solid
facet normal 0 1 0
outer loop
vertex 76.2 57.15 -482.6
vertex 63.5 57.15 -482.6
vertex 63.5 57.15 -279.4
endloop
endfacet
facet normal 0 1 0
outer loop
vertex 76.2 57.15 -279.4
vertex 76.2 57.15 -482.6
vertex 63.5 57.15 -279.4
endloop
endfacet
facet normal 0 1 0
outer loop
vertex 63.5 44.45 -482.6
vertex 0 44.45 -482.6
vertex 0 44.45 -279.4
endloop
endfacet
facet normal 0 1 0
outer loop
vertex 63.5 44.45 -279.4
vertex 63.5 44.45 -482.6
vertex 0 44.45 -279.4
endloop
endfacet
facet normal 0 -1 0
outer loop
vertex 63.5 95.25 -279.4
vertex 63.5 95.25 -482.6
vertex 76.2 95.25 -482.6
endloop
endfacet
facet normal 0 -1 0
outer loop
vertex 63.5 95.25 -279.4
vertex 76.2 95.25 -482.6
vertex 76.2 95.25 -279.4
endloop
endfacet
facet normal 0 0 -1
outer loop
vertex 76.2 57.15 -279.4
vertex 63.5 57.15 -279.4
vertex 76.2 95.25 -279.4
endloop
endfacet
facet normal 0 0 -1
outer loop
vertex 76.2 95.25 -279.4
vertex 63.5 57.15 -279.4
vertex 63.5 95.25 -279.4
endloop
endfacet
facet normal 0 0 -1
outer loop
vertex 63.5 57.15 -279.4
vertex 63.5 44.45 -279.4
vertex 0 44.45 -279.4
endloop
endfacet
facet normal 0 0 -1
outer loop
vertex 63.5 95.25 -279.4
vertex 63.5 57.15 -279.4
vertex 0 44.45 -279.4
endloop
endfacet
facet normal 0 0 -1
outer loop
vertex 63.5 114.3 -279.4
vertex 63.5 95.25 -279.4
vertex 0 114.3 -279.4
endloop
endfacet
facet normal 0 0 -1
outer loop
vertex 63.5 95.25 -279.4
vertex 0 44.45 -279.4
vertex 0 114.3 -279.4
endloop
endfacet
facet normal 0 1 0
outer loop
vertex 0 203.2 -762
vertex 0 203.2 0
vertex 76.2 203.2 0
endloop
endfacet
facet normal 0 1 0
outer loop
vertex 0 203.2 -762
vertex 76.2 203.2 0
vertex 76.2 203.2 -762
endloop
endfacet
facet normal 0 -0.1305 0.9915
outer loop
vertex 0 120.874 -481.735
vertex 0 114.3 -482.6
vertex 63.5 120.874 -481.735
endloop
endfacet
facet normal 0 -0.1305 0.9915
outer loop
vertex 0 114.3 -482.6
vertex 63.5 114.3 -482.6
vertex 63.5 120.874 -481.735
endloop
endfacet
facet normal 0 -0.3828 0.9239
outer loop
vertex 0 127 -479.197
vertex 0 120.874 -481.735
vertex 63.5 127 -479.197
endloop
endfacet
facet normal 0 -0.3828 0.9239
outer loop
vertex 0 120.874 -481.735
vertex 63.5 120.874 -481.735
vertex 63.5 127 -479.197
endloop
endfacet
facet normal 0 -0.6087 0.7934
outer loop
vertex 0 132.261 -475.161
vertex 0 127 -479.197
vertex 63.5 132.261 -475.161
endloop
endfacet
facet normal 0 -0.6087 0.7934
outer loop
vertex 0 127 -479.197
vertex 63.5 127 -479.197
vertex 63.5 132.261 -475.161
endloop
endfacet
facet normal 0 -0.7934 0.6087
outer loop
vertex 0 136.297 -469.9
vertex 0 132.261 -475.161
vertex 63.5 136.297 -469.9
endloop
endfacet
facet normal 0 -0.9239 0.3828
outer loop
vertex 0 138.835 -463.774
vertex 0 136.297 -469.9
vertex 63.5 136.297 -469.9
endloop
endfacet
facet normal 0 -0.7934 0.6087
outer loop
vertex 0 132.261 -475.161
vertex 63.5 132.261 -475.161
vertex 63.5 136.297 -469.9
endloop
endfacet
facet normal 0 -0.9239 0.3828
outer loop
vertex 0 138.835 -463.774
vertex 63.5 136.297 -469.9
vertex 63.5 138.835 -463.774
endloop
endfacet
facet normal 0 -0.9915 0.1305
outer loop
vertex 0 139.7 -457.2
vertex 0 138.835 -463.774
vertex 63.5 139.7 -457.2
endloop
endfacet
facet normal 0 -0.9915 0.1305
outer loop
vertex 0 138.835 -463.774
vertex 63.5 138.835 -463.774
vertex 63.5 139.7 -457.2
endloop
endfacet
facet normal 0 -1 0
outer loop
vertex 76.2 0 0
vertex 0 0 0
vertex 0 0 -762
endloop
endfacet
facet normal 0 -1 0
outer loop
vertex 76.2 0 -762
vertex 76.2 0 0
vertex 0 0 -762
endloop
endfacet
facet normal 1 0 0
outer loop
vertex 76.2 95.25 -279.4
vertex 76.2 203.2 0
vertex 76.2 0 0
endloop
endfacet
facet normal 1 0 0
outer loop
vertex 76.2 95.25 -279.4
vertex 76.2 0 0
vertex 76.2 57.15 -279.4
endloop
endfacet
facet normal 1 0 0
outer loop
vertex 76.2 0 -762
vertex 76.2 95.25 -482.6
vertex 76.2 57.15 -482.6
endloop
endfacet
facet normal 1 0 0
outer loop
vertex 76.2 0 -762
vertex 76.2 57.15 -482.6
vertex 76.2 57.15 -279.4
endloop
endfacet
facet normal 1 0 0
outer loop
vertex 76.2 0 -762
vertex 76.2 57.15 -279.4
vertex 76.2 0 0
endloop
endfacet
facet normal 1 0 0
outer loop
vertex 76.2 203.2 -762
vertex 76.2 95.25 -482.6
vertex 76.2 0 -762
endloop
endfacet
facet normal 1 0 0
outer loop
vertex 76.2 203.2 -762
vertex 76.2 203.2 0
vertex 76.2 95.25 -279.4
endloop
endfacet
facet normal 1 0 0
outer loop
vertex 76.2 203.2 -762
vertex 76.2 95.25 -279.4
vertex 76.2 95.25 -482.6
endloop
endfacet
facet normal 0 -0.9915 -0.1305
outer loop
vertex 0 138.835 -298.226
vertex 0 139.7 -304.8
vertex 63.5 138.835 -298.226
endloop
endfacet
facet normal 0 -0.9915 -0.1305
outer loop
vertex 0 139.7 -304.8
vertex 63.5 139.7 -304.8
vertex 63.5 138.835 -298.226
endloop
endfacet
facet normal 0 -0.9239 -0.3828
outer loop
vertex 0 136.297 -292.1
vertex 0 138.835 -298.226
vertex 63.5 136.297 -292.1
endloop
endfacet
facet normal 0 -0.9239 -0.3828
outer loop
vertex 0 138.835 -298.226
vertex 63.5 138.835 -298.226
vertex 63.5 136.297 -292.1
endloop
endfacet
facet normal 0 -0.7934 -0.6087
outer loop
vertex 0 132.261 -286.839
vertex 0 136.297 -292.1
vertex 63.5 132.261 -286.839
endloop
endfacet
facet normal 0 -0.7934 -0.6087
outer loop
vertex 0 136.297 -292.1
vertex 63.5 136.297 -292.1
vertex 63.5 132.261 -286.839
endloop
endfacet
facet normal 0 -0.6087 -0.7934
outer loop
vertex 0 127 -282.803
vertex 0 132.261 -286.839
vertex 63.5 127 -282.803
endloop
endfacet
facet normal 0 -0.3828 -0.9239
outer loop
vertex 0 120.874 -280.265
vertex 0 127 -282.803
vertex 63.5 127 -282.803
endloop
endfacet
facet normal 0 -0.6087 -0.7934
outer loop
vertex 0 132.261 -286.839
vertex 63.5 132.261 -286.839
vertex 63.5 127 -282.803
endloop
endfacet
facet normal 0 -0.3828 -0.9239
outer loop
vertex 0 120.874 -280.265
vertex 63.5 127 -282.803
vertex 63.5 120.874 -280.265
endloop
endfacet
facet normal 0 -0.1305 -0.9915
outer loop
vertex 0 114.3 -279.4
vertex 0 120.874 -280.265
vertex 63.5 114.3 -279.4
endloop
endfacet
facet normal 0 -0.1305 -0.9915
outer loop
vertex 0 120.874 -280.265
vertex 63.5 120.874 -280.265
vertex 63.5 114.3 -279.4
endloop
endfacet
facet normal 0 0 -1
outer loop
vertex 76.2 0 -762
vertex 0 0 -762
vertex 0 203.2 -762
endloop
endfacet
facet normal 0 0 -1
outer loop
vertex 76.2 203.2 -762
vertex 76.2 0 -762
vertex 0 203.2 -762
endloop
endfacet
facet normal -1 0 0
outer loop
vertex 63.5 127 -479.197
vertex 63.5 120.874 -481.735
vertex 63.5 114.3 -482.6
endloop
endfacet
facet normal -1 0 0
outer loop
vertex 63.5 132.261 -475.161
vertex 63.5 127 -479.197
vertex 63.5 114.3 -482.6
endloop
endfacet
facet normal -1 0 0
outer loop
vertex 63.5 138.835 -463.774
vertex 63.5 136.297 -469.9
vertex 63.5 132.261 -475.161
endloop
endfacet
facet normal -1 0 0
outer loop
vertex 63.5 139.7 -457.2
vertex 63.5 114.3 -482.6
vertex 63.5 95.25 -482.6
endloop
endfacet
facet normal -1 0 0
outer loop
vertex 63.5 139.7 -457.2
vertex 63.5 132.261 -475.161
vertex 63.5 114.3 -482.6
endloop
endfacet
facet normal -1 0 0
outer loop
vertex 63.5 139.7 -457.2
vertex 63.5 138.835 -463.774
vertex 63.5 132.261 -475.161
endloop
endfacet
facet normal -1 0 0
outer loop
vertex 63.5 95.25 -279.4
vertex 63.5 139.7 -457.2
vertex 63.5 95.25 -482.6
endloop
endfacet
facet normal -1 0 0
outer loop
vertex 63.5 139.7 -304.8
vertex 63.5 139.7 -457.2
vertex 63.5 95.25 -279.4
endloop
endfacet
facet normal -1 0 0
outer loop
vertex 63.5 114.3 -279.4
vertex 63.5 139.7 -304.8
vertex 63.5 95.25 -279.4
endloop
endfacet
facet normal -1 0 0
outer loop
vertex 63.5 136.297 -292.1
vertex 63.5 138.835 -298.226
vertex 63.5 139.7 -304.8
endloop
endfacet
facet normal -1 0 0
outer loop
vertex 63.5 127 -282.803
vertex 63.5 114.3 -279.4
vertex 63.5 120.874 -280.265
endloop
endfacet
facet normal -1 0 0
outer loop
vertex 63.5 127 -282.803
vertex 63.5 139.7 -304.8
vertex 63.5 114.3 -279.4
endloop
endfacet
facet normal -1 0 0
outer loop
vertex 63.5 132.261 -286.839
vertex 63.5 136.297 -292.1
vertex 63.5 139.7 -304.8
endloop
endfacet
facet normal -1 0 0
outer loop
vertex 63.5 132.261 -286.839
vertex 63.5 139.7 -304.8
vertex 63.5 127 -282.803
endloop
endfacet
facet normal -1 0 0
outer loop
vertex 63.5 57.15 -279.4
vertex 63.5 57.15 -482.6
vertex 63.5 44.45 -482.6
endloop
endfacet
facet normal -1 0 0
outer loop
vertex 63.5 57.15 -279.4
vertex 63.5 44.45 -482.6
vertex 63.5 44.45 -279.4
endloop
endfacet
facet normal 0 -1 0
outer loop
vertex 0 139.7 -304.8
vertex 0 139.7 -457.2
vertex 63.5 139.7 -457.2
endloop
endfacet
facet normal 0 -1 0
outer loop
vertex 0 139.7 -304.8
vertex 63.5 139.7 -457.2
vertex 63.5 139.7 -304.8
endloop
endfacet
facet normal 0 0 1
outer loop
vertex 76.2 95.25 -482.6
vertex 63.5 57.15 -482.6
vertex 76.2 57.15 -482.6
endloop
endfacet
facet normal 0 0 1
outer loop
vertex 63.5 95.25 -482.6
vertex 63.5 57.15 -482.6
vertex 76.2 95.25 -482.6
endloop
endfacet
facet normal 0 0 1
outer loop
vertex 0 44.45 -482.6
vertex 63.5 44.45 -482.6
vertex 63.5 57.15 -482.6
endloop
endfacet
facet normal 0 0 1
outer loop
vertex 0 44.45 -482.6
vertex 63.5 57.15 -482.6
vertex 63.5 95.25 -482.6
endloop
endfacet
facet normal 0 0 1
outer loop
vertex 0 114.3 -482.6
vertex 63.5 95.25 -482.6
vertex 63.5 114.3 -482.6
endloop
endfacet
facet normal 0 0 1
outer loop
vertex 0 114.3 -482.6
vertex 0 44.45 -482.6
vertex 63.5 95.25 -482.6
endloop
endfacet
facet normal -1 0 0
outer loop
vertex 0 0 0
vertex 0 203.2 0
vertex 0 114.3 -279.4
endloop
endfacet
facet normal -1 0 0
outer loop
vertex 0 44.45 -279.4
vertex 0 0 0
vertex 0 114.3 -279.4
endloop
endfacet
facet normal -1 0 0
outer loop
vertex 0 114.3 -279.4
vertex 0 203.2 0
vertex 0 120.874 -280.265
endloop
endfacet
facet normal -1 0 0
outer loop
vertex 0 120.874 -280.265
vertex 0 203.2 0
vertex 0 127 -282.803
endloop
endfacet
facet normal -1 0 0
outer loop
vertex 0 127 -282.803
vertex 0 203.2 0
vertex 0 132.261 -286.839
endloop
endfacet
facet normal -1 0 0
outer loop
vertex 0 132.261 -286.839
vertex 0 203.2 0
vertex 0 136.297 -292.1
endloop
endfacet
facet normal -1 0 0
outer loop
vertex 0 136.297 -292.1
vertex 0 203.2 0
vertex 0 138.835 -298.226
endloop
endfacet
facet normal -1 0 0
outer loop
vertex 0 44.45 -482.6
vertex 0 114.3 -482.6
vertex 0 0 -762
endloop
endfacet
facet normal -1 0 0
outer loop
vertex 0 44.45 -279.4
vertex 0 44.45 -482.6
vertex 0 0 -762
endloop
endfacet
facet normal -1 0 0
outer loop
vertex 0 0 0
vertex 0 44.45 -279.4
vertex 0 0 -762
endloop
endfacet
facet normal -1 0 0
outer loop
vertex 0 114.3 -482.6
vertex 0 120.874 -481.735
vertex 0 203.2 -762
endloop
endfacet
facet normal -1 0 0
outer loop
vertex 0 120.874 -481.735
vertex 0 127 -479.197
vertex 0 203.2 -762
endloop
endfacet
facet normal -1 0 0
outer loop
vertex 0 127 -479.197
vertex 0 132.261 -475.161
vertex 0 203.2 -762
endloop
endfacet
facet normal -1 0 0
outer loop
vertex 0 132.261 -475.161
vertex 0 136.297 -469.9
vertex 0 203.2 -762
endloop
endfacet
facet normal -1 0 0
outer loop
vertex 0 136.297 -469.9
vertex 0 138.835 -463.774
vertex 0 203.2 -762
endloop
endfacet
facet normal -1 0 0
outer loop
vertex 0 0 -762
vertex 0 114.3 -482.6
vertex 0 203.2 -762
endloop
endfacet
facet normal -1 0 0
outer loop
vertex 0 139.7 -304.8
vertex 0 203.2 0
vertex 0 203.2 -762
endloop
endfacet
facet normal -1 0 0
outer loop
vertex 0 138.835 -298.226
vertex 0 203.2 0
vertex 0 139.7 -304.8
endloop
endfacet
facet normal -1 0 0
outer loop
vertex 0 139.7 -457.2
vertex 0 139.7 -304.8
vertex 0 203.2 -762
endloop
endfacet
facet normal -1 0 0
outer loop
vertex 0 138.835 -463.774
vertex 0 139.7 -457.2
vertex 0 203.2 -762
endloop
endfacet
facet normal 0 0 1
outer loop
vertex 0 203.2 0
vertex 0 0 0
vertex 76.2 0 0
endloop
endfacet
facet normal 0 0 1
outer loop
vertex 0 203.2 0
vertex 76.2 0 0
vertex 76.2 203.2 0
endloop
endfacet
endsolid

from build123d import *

# Parameters (mm, degrees)
SKETCH1_W           = 762
SKETCH1_H           = 203.2
BOSS_EXTRUDE1_DEPTH = 76.2
SKETCH2_W           = 203.2
SKETCH2_H           = 95.25
CUT_EXTRUDE1_DEPTH  = 63.5
SKETCH3_W           = 203.2
SKETCH3_H           = 38.1
CUT_EXTRUDE2_DEPTH  = 792.18044086
FILLET1_R           = 25.4


with BuildPart() as part:
    # Sketch1 → Boss-Extrude1 (new body)
    with BuildSketch(Plane(origin=(0, 0, 0), x_dir=(0, 0, -1), z_dir=(1, 0, 0))):
        with Locations((381, 101.6)):
            Rectangle(SKETCH1_W, SKETCH1_H)
    extrude(amount=BOSS_EXTRUDE1_DEPTH)

    # Sketch2 → Cut-Extrude1 (cut)
    with BuildSketch(Plane.ZY):
        with Locations((-381, 92.075)):
            Rectangle(SKETCH2_W, SKETCH2_H)
    extrude(amount=-CUT_EXTRUDE1_DEPTH, mode=Mode.SUBTRACT)

    # Sketch3 → Cut-Extrude2 (cut, through all)
    with BuildSketch(Plane.ZY.offset(-63.5)):
        with Locations((-381, 76.2)):
            Rectangle(SKETCH3_W, SKETCH3_H)
    extrude(amount=-CUT_EXTRUDE2_DEPTH, mode=Mode.SUBTRACT)

    # Fillet1
    fillet1_edges = [part.edges().sort_by_distance(p)[0] for p in [
        (31.75, 139.7, -482.6),
        (31.75, 139.7, -279.4),
    ]]
    fillet(fillet1_edges, radius=FILLET1_R)


solid = part.part
